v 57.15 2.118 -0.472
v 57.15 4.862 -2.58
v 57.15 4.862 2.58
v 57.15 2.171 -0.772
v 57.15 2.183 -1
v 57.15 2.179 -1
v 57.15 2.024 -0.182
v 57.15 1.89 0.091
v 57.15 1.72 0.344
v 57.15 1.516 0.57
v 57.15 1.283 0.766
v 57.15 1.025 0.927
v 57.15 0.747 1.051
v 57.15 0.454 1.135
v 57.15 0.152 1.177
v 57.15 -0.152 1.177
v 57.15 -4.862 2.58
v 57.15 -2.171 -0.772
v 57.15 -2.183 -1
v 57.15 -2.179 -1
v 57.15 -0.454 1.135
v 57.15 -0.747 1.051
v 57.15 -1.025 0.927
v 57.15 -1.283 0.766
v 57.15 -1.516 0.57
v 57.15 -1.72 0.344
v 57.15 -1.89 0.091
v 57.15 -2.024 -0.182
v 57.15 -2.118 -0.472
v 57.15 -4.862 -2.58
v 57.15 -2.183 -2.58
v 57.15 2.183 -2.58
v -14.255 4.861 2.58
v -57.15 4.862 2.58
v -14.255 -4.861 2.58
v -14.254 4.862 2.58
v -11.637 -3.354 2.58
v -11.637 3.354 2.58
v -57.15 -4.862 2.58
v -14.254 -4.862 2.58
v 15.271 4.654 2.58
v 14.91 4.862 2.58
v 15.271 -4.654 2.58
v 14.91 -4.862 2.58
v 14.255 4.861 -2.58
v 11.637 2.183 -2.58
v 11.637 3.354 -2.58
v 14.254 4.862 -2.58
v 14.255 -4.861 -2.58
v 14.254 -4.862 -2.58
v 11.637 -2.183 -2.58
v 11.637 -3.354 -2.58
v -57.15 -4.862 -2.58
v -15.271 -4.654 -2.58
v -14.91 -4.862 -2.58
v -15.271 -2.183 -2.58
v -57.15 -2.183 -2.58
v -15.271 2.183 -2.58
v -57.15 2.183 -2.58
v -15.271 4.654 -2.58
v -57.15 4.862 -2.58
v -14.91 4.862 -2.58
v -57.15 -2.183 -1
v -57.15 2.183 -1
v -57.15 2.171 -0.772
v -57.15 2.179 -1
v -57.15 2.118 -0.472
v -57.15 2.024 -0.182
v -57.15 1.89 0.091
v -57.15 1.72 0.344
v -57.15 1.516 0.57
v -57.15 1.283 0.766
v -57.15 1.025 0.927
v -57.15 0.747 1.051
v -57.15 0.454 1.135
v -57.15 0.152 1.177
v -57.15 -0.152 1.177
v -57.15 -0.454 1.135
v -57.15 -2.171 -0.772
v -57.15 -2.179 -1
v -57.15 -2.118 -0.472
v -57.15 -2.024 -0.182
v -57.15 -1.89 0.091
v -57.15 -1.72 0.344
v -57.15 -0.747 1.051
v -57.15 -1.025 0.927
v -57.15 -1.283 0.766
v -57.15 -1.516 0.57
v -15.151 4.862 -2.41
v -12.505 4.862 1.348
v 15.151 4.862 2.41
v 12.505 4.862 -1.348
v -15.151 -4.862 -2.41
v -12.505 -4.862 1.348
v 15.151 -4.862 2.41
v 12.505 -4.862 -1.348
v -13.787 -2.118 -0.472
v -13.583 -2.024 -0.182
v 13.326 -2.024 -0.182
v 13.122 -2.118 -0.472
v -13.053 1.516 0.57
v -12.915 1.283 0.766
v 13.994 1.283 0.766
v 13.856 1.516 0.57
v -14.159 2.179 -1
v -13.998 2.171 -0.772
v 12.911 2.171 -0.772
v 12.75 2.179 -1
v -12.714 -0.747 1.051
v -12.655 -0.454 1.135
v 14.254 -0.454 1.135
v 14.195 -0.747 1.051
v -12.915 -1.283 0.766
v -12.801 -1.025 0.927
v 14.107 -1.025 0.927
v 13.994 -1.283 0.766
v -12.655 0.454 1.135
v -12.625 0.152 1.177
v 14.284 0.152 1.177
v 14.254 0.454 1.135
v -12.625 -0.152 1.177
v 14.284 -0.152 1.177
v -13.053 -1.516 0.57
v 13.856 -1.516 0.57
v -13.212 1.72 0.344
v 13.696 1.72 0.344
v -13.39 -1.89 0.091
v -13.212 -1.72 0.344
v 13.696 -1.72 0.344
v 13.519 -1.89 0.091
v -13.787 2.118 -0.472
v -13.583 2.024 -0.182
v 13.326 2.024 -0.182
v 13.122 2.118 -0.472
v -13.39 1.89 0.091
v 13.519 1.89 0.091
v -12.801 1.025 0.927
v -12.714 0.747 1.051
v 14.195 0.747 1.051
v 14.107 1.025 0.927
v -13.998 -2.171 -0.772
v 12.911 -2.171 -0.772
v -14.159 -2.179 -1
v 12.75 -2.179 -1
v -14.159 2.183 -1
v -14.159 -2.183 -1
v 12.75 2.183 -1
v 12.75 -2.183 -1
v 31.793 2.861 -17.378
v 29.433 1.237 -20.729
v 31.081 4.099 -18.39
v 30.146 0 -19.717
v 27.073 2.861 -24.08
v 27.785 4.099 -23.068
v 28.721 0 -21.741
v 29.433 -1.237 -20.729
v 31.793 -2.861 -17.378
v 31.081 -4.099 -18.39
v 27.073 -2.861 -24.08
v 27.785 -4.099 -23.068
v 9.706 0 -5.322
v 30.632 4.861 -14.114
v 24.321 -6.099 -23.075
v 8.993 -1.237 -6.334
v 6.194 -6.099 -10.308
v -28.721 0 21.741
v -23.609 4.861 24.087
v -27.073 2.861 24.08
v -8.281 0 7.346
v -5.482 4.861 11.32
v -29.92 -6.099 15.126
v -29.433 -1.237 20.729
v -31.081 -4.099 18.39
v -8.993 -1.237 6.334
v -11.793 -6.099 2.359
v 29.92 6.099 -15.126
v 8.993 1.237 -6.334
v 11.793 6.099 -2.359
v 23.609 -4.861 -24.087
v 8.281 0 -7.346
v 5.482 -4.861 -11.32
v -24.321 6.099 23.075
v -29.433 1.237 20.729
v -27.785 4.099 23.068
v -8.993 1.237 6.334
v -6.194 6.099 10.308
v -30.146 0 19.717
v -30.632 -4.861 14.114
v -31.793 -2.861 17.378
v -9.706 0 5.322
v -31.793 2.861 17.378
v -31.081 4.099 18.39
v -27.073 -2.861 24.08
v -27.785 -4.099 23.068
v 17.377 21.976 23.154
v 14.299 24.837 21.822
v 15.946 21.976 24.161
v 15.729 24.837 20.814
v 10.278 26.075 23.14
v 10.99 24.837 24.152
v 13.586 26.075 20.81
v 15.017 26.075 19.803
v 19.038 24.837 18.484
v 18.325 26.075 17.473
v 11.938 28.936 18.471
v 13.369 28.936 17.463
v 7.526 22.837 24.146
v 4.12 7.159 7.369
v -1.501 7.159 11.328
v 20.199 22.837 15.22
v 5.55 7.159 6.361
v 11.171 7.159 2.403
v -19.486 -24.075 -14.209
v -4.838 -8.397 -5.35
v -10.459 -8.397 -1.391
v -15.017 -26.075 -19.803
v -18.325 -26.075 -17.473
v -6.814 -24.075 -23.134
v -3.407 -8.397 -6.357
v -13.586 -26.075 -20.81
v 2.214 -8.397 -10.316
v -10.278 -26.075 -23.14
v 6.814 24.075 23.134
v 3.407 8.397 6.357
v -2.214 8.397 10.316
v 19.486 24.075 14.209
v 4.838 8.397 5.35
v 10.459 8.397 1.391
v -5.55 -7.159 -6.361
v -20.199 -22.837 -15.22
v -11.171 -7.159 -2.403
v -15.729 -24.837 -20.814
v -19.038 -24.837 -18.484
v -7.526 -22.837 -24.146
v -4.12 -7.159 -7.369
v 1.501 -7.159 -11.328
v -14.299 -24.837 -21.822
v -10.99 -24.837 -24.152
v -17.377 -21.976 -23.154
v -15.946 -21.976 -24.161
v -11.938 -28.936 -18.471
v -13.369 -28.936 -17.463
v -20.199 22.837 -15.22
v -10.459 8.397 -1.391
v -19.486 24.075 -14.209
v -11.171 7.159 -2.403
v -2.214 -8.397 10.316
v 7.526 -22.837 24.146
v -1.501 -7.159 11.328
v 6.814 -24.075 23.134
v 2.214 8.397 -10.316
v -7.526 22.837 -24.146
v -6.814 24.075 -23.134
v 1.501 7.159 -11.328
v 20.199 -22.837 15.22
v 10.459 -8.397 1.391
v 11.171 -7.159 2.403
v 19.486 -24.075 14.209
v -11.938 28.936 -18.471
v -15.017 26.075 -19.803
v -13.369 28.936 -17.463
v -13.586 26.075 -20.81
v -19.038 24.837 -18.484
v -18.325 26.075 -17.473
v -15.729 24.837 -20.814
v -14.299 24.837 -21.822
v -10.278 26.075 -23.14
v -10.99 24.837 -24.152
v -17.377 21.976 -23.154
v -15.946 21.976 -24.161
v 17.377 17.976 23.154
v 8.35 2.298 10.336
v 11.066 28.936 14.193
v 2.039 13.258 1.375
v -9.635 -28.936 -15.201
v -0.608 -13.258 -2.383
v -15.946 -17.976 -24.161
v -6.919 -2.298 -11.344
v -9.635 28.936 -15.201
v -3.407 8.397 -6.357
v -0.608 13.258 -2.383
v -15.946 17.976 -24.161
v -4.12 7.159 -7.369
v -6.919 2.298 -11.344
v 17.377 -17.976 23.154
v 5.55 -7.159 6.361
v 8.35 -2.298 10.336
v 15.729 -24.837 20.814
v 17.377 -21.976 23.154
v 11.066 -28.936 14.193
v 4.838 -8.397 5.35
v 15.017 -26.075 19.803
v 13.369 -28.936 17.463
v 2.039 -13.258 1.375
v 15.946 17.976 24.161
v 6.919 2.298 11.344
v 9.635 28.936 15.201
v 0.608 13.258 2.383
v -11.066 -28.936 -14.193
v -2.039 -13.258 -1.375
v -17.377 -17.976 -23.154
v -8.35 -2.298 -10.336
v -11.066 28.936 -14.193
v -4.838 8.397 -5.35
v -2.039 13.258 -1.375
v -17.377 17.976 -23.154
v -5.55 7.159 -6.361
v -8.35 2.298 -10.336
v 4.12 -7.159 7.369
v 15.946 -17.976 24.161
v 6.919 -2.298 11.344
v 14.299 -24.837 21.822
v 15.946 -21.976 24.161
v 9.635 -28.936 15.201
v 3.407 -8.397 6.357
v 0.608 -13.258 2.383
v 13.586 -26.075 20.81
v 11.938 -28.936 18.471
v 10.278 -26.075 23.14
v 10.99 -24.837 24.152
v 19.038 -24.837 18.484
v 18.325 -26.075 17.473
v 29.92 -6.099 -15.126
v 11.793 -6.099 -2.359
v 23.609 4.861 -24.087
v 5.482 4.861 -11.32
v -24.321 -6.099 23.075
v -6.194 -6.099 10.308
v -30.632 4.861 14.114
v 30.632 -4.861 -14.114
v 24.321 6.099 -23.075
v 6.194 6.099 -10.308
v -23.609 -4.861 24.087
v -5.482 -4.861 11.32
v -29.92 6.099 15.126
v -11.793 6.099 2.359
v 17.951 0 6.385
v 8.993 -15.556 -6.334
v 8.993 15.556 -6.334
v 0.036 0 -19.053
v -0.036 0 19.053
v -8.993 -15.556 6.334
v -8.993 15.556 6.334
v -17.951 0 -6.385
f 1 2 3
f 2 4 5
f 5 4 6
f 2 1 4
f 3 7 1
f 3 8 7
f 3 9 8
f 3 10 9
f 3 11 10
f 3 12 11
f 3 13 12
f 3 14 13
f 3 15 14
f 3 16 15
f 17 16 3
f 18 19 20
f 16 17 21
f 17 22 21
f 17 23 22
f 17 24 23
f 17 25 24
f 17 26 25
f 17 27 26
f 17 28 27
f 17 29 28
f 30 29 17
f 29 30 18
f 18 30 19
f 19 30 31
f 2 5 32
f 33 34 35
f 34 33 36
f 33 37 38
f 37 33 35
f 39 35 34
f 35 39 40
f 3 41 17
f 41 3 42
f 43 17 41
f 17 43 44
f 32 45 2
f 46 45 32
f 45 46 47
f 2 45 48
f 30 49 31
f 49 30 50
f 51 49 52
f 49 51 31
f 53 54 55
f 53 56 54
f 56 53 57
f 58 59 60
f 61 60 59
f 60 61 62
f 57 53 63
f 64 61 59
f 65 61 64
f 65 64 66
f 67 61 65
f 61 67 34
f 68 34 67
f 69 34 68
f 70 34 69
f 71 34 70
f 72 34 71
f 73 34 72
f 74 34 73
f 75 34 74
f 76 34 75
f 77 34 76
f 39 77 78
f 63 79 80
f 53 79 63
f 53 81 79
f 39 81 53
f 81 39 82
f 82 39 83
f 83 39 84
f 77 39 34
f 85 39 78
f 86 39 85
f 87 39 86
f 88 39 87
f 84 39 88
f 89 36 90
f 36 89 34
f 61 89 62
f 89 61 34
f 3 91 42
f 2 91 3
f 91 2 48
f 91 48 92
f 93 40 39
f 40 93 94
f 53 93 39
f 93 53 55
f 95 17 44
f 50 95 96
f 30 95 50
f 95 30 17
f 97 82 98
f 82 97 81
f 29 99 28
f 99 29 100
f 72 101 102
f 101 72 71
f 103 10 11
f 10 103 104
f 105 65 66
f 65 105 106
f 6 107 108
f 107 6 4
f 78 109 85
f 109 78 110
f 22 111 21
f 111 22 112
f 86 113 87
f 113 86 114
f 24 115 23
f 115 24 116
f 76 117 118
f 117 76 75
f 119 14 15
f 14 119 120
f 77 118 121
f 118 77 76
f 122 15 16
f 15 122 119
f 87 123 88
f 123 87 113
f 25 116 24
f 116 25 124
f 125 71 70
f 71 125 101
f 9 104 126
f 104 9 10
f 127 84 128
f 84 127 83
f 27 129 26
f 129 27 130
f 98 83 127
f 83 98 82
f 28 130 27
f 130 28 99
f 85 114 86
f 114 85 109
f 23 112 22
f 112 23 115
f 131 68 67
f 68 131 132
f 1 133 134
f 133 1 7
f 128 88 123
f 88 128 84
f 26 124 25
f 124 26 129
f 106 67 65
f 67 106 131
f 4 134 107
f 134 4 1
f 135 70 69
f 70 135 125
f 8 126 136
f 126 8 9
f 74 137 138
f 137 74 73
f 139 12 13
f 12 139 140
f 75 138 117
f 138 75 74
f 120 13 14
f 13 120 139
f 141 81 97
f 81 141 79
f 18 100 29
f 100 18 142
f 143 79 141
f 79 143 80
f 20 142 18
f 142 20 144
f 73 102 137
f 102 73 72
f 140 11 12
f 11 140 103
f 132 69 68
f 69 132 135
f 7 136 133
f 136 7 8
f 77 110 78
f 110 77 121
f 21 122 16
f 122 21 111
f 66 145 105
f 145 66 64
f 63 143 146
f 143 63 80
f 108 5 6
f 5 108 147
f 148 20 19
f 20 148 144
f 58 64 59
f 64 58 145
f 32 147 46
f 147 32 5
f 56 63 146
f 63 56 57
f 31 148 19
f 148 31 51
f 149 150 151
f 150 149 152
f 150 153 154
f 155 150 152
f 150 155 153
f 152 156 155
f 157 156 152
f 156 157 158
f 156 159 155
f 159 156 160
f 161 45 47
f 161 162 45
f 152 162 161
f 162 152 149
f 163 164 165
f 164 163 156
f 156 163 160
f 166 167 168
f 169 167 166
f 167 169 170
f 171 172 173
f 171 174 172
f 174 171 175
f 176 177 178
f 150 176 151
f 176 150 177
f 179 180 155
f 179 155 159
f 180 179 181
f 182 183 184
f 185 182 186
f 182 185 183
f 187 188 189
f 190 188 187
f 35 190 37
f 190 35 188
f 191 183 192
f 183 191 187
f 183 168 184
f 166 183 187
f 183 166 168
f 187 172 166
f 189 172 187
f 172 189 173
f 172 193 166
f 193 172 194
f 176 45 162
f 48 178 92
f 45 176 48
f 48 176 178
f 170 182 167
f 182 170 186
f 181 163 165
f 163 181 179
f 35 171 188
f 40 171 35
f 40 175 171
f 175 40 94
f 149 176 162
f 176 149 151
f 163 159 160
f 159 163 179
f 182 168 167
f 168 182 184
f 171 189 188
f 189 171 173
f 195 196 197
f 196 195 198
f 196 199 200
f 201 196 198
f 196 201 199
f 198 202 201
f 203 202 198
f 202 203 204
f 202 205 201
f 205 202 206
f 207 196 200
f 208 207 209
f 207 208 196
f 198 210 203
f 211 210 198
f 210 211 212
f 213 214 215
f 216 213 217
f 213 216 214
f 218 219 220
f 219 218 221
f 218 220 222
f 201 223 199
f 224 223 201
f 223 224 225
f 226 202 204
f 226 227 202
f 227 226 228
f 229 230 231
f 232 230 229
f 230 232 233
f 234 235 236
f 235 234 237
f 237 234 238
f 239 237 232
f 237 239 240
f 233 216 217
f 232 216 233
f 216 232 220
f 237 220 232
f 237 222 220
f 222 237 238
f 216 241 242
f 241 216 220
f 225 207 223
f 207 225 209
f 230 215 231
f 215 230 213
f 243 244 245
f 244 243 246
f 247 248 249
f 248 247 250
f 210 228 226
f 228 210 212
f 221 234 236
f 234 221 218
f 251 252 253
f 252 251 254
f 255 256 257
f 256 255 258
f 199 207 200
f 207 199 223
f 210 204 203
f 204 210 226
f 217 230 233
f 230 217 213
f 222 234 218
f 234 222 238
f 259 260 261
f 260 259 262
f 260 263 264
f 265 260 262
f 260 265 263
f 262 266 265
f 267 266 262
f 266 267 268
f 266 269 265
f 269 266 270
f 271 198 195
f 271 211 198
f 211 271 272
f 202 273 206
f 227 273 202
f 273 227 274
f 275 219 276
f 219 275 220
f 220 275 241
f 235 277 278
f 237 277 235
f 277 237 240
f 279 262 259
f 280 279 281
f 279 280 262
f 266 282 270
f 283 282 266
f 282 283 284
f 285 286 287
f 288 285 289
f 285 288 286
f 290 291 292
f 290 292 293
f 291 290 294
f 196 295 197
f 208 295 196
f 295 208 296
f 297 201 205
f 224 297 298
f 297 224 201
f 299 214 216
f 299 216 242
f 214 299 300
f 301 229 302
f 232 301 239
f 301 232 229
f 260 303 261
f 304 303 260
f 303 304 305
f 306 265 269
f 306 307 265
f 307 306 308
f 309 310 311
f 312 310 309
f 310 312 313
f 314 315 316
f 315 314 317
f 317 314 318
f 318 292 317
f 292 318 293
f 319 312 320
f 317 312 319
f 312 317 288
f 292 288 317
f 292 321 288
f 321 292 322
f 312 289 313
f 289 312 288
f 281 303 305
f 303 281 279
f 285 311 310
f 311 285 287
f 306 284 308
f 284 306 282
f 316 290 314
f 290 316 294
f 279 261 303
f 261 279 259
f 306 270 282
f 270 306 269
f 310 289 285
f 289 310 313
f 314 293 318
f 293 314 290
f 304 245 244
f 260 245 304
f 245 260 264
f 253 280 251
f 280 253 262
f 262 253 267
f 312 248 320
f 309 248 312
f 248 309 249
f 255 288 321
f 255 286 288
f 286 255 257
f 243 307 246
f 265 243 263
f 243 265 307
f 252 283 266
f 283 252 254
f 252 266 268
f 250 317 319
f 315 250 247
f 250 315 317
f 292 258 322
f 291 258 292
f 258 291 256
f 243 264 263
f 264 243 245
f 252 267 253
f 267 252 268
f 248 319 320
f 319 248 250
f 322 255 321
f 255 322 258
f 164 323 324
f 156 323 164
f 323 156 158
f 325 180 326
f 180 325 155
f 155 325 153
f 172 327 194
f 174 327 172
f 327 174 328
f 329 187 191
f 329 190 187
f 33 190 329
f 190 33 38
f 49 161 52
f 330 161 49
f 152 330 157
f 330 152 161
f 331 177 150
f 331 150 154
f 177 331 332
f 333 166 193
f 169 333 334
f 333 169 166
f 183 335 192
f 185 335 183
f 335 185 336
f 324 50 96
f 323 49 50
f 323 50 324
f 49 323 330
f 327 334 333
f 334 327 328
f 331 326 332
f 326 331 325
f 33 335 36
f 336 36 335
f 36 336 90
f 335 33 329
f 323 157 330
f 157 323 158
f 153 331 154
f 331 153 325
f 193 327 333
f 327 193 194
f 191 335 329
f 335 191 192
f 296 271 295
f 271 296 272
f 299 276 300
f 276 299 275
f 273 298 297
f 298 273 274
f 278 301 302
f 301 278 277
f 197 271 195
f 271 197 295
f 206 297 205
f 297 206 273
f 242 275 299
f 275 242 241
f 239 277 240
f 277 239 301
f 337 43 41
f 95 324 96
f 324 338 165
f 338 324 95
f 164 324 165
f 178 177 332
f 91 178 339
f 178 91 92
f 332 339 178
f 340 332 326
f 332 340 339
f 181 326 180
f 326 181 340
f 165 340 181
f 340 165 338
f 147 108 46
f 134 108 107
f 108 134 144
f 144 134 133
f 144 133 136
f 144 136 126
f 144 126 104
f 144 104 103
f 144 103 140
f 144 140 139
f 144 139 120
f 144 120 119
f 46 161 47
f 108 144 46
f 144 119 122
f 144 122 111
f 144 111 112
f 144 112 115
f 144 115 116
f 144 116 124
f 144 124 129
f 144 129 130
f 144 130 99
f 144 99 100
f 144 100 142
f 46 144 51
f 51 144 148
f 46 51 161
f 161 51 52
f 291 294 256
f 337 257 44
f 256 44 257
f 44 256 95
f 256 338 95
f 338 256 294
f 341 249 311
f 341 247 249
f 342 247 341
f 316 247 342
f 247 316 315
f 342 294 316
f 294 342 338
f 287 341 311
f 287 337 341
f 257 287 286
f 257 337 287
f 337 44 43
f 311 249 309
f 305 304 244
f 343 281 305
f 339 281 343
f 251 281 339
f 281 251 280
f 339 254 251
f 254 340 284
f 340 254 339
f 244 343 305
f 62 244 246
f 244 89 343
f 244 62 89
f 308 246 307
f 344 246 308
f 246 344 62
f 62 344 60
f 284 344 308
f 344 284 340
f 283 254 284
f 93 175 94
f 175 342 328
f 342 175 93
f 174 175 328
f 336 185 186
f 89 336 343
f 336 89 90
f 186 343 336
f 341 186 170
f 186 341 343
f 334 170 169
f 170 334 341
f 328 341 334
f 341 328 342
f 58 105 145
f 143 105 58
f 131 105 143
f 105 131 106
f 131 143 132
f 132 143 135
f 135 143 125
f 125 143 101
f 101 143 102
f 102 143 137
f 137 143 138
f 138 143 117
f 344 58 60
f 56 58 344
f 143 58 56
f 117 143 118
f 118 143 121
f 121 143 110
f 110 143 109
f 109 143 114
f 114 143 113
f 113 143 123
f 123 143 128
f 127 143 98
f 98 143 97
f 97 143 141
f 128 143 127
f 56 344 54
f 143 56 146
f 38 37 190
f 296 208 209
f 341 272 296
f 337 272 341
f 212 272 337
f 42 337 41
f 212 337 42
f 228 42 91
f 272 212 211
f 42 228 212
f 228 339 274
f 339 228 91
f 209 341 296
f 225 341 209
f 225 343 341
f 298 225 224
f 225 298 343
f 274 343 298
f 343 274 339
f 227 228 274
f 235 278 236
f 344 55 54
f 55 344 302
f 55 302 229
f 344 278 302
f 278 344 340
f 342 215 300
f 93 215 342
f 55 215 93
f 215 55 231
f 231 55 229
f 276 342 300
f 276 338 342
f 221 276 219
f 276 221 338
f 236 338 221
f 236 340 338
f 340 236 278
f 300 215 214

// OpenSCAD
// file: chaos_toy.scad
// chaos_toy.scad

// Chaos Toy part library by W. Craig Trader is dual-licensed under 
// Creative Commons Attribution-ShareAlike 3.0 Unported License and
// GNU Lesser GPL 3.0 or later.

include <MCAD/units.scad>

// ----- Measurements ---------------------------------------------------------

rch = 1 / 128 * inch;

BALL_OD = 92 * rch;

JACK_BASE = 22 * mm; // 111 * rch; 
JACK_SPAR_LEN = 25 * mm; // 126 * rch; // 25 * mm;
JACK_SPAR_WID = 15.5 * mm; // 78 * rch;
JACK_SPAR_DEP = 1.75 * mm; // 9 * rch;
JACK_SIZE = JACK_SPAR_LEN + JACK_BASE + JACK_SPAR_LEN;

TUBE_ID = 78.5 * rch;
TUBE_OD = 96.5 * rch;

TUBE_SMALL = 15 * cm;
TUBE_MEDIUM = TUBE_SMALL + JACK_BASE + TUBE_SMALL;
TUBE_LONG = TUBE_MEDIUM + JACK_BASE + TUBE_SMALL;

CONNECTOR_LENGTH = 39 * rch;

TRACK_RAIL_WIDTH = 25 * rch;
TRACK_RAIL_HEIGHT = 34 * rch;
TRACK_RAIL_SPACING = 96 * rch;
TRACK_BASE_HEIGHT = 26 * rch;
TRACK_BASE_WIDTH = 49 * rch;
TRACK_BASE_ID = 22 * rch;

TRACK_SHORT_LENGTH = 4.5 * inch;
TRACK_LONG_LENGTH = 2 * TRACK_SHORT_LENGTH;

// ----- Measurement Checks ---------------------------------------------------

function inches( d ) =
	str( floor( d/inch ), "+", floor( 128 * ( d/inch - floor( d/inch ) ) ), "/128 in." );

function verbose_measurement( label, dimension ) = 
	str( label, " = ", dimension, "mm or ", inches( dimension ) );

module echo_all_measurements() {
	echo( verbose_measurement( "Ball diameter", BALL_OD ) );

	echo( verbose_measurement( "Tube inside diameter", TUBE_ID ) );
	echo( verbose_measurement( "Tube outside diameter", TUBE_OD ) );

	echo( verbose_measurement( "Small tube length", TUBE_SMALL ) );
	echo( verbose_measurement( "Medium tube length", TUBE_MEDIUM ) );
	echo( verbose_measurement( "Long tube length", TUBE_LONG ) );

	echo( verbose_measurement( "Jack base", JACK_BASE ) );
	echo( verbose_measurement( "Jack spar length", JACK_SPAR_LEN ) );
	echo( verbose_measurement( "Jack spar width", JACK_SPAR_WID ) );
	echo( verbose_measurement( "Jack spar depth", JACK_SPAR_DEP ) );
	echo( verbose_measurement( "Jack size", JACK_SIZE ) );
}

// echo_all_measurements();

// ----- Ball -----------------------------------------------------------------

module ball () {
	color( [1,1,0,1] ) 
	sphere( r=BALL_DIAMETER );
}

// ----- Tubes ----------------------------------------------------------------

module tube( length ) {
	color( [0,0,1,1] )
	difference() {
		cylinder( h=length, r=TUBE_OD/2, center=true, $fn=90 );
		cylinder( h=length+2*mm, r=TUBE_ID/2, center=true, $fn=90 );
	}
}

// ----- Jacks ----------------------------------------------------------------

module jack_spar() {
	x = JACK_SIZE / 2;
	y = JACK_SPAR_WID / 2;
	difference() {
		cube( [ JACK_SIZE, JACK_SPAR_WID, JACK_SPAR_DEP ], true );
		translate( [+x,+y,0] ) rotate( [0,0,45] ) cube( 4*mm, true );
		translate( [+x,-y,0] ) rotate( [0,0,45] ) cube( 4*mm, true );
		translate( [-x,+y,0] ) rotate( [0,0,45] ) cube( 4*mm, true );
		translate( [-x,-y,0] ) rotate( [0,0,45] ) cube( 4*mm, true );
	}
}

module jack() {
	color( [0,0,0,1] )
	union() {
		jack_spar();
		rotate( [00,00,90] ) jack_spar();
		rotate( [00,90,00] ) jack_spar();
		rotate( [00,90,90] ) jack_spar();
		rotate( [90,00,00] ) jack_spar();
		rotate( [90,00,90] ) jack_spar();
		cube( JACK_BASE, center=true );
	}
}

// ----- Straight Track -------------------------------------------------------

module track_base( length ) {
	offset = -1 * mm;
	difference() {
		cube( [ length, TRACK_BASE_WIDTH, TRACK_BASE_HEIGHT ], true );
		translate( [0, 0, offset ] ) rotate( [ 0, 90, 0 ] ) 
			cylinder( h=length+2*mm, r=TRACK_BASE_ID/2, center=true, $fn=45 );
		translate( [0, 0, -TRACK_BASE_ID/2+offset ] ) 
			cube( [ length+2*mm, TRACK_BASE_ID, TRACK_BASE_ID ], center=true );
	}
}

track_base( TRACK_SHORT_LENGTH );
// main file
// chaos_toy_jack.scad

// Chaos Toy part library by W. Craig Trader is dual-licensed under 
// Creative Commons Attribution-ShareAlike 3.0 Unported License and
// GNU Lesser GPL 3.0 or later.

include <chaos_toy.scad>

rotate( [ 45, 35.15625, 0 ] )
jack();
